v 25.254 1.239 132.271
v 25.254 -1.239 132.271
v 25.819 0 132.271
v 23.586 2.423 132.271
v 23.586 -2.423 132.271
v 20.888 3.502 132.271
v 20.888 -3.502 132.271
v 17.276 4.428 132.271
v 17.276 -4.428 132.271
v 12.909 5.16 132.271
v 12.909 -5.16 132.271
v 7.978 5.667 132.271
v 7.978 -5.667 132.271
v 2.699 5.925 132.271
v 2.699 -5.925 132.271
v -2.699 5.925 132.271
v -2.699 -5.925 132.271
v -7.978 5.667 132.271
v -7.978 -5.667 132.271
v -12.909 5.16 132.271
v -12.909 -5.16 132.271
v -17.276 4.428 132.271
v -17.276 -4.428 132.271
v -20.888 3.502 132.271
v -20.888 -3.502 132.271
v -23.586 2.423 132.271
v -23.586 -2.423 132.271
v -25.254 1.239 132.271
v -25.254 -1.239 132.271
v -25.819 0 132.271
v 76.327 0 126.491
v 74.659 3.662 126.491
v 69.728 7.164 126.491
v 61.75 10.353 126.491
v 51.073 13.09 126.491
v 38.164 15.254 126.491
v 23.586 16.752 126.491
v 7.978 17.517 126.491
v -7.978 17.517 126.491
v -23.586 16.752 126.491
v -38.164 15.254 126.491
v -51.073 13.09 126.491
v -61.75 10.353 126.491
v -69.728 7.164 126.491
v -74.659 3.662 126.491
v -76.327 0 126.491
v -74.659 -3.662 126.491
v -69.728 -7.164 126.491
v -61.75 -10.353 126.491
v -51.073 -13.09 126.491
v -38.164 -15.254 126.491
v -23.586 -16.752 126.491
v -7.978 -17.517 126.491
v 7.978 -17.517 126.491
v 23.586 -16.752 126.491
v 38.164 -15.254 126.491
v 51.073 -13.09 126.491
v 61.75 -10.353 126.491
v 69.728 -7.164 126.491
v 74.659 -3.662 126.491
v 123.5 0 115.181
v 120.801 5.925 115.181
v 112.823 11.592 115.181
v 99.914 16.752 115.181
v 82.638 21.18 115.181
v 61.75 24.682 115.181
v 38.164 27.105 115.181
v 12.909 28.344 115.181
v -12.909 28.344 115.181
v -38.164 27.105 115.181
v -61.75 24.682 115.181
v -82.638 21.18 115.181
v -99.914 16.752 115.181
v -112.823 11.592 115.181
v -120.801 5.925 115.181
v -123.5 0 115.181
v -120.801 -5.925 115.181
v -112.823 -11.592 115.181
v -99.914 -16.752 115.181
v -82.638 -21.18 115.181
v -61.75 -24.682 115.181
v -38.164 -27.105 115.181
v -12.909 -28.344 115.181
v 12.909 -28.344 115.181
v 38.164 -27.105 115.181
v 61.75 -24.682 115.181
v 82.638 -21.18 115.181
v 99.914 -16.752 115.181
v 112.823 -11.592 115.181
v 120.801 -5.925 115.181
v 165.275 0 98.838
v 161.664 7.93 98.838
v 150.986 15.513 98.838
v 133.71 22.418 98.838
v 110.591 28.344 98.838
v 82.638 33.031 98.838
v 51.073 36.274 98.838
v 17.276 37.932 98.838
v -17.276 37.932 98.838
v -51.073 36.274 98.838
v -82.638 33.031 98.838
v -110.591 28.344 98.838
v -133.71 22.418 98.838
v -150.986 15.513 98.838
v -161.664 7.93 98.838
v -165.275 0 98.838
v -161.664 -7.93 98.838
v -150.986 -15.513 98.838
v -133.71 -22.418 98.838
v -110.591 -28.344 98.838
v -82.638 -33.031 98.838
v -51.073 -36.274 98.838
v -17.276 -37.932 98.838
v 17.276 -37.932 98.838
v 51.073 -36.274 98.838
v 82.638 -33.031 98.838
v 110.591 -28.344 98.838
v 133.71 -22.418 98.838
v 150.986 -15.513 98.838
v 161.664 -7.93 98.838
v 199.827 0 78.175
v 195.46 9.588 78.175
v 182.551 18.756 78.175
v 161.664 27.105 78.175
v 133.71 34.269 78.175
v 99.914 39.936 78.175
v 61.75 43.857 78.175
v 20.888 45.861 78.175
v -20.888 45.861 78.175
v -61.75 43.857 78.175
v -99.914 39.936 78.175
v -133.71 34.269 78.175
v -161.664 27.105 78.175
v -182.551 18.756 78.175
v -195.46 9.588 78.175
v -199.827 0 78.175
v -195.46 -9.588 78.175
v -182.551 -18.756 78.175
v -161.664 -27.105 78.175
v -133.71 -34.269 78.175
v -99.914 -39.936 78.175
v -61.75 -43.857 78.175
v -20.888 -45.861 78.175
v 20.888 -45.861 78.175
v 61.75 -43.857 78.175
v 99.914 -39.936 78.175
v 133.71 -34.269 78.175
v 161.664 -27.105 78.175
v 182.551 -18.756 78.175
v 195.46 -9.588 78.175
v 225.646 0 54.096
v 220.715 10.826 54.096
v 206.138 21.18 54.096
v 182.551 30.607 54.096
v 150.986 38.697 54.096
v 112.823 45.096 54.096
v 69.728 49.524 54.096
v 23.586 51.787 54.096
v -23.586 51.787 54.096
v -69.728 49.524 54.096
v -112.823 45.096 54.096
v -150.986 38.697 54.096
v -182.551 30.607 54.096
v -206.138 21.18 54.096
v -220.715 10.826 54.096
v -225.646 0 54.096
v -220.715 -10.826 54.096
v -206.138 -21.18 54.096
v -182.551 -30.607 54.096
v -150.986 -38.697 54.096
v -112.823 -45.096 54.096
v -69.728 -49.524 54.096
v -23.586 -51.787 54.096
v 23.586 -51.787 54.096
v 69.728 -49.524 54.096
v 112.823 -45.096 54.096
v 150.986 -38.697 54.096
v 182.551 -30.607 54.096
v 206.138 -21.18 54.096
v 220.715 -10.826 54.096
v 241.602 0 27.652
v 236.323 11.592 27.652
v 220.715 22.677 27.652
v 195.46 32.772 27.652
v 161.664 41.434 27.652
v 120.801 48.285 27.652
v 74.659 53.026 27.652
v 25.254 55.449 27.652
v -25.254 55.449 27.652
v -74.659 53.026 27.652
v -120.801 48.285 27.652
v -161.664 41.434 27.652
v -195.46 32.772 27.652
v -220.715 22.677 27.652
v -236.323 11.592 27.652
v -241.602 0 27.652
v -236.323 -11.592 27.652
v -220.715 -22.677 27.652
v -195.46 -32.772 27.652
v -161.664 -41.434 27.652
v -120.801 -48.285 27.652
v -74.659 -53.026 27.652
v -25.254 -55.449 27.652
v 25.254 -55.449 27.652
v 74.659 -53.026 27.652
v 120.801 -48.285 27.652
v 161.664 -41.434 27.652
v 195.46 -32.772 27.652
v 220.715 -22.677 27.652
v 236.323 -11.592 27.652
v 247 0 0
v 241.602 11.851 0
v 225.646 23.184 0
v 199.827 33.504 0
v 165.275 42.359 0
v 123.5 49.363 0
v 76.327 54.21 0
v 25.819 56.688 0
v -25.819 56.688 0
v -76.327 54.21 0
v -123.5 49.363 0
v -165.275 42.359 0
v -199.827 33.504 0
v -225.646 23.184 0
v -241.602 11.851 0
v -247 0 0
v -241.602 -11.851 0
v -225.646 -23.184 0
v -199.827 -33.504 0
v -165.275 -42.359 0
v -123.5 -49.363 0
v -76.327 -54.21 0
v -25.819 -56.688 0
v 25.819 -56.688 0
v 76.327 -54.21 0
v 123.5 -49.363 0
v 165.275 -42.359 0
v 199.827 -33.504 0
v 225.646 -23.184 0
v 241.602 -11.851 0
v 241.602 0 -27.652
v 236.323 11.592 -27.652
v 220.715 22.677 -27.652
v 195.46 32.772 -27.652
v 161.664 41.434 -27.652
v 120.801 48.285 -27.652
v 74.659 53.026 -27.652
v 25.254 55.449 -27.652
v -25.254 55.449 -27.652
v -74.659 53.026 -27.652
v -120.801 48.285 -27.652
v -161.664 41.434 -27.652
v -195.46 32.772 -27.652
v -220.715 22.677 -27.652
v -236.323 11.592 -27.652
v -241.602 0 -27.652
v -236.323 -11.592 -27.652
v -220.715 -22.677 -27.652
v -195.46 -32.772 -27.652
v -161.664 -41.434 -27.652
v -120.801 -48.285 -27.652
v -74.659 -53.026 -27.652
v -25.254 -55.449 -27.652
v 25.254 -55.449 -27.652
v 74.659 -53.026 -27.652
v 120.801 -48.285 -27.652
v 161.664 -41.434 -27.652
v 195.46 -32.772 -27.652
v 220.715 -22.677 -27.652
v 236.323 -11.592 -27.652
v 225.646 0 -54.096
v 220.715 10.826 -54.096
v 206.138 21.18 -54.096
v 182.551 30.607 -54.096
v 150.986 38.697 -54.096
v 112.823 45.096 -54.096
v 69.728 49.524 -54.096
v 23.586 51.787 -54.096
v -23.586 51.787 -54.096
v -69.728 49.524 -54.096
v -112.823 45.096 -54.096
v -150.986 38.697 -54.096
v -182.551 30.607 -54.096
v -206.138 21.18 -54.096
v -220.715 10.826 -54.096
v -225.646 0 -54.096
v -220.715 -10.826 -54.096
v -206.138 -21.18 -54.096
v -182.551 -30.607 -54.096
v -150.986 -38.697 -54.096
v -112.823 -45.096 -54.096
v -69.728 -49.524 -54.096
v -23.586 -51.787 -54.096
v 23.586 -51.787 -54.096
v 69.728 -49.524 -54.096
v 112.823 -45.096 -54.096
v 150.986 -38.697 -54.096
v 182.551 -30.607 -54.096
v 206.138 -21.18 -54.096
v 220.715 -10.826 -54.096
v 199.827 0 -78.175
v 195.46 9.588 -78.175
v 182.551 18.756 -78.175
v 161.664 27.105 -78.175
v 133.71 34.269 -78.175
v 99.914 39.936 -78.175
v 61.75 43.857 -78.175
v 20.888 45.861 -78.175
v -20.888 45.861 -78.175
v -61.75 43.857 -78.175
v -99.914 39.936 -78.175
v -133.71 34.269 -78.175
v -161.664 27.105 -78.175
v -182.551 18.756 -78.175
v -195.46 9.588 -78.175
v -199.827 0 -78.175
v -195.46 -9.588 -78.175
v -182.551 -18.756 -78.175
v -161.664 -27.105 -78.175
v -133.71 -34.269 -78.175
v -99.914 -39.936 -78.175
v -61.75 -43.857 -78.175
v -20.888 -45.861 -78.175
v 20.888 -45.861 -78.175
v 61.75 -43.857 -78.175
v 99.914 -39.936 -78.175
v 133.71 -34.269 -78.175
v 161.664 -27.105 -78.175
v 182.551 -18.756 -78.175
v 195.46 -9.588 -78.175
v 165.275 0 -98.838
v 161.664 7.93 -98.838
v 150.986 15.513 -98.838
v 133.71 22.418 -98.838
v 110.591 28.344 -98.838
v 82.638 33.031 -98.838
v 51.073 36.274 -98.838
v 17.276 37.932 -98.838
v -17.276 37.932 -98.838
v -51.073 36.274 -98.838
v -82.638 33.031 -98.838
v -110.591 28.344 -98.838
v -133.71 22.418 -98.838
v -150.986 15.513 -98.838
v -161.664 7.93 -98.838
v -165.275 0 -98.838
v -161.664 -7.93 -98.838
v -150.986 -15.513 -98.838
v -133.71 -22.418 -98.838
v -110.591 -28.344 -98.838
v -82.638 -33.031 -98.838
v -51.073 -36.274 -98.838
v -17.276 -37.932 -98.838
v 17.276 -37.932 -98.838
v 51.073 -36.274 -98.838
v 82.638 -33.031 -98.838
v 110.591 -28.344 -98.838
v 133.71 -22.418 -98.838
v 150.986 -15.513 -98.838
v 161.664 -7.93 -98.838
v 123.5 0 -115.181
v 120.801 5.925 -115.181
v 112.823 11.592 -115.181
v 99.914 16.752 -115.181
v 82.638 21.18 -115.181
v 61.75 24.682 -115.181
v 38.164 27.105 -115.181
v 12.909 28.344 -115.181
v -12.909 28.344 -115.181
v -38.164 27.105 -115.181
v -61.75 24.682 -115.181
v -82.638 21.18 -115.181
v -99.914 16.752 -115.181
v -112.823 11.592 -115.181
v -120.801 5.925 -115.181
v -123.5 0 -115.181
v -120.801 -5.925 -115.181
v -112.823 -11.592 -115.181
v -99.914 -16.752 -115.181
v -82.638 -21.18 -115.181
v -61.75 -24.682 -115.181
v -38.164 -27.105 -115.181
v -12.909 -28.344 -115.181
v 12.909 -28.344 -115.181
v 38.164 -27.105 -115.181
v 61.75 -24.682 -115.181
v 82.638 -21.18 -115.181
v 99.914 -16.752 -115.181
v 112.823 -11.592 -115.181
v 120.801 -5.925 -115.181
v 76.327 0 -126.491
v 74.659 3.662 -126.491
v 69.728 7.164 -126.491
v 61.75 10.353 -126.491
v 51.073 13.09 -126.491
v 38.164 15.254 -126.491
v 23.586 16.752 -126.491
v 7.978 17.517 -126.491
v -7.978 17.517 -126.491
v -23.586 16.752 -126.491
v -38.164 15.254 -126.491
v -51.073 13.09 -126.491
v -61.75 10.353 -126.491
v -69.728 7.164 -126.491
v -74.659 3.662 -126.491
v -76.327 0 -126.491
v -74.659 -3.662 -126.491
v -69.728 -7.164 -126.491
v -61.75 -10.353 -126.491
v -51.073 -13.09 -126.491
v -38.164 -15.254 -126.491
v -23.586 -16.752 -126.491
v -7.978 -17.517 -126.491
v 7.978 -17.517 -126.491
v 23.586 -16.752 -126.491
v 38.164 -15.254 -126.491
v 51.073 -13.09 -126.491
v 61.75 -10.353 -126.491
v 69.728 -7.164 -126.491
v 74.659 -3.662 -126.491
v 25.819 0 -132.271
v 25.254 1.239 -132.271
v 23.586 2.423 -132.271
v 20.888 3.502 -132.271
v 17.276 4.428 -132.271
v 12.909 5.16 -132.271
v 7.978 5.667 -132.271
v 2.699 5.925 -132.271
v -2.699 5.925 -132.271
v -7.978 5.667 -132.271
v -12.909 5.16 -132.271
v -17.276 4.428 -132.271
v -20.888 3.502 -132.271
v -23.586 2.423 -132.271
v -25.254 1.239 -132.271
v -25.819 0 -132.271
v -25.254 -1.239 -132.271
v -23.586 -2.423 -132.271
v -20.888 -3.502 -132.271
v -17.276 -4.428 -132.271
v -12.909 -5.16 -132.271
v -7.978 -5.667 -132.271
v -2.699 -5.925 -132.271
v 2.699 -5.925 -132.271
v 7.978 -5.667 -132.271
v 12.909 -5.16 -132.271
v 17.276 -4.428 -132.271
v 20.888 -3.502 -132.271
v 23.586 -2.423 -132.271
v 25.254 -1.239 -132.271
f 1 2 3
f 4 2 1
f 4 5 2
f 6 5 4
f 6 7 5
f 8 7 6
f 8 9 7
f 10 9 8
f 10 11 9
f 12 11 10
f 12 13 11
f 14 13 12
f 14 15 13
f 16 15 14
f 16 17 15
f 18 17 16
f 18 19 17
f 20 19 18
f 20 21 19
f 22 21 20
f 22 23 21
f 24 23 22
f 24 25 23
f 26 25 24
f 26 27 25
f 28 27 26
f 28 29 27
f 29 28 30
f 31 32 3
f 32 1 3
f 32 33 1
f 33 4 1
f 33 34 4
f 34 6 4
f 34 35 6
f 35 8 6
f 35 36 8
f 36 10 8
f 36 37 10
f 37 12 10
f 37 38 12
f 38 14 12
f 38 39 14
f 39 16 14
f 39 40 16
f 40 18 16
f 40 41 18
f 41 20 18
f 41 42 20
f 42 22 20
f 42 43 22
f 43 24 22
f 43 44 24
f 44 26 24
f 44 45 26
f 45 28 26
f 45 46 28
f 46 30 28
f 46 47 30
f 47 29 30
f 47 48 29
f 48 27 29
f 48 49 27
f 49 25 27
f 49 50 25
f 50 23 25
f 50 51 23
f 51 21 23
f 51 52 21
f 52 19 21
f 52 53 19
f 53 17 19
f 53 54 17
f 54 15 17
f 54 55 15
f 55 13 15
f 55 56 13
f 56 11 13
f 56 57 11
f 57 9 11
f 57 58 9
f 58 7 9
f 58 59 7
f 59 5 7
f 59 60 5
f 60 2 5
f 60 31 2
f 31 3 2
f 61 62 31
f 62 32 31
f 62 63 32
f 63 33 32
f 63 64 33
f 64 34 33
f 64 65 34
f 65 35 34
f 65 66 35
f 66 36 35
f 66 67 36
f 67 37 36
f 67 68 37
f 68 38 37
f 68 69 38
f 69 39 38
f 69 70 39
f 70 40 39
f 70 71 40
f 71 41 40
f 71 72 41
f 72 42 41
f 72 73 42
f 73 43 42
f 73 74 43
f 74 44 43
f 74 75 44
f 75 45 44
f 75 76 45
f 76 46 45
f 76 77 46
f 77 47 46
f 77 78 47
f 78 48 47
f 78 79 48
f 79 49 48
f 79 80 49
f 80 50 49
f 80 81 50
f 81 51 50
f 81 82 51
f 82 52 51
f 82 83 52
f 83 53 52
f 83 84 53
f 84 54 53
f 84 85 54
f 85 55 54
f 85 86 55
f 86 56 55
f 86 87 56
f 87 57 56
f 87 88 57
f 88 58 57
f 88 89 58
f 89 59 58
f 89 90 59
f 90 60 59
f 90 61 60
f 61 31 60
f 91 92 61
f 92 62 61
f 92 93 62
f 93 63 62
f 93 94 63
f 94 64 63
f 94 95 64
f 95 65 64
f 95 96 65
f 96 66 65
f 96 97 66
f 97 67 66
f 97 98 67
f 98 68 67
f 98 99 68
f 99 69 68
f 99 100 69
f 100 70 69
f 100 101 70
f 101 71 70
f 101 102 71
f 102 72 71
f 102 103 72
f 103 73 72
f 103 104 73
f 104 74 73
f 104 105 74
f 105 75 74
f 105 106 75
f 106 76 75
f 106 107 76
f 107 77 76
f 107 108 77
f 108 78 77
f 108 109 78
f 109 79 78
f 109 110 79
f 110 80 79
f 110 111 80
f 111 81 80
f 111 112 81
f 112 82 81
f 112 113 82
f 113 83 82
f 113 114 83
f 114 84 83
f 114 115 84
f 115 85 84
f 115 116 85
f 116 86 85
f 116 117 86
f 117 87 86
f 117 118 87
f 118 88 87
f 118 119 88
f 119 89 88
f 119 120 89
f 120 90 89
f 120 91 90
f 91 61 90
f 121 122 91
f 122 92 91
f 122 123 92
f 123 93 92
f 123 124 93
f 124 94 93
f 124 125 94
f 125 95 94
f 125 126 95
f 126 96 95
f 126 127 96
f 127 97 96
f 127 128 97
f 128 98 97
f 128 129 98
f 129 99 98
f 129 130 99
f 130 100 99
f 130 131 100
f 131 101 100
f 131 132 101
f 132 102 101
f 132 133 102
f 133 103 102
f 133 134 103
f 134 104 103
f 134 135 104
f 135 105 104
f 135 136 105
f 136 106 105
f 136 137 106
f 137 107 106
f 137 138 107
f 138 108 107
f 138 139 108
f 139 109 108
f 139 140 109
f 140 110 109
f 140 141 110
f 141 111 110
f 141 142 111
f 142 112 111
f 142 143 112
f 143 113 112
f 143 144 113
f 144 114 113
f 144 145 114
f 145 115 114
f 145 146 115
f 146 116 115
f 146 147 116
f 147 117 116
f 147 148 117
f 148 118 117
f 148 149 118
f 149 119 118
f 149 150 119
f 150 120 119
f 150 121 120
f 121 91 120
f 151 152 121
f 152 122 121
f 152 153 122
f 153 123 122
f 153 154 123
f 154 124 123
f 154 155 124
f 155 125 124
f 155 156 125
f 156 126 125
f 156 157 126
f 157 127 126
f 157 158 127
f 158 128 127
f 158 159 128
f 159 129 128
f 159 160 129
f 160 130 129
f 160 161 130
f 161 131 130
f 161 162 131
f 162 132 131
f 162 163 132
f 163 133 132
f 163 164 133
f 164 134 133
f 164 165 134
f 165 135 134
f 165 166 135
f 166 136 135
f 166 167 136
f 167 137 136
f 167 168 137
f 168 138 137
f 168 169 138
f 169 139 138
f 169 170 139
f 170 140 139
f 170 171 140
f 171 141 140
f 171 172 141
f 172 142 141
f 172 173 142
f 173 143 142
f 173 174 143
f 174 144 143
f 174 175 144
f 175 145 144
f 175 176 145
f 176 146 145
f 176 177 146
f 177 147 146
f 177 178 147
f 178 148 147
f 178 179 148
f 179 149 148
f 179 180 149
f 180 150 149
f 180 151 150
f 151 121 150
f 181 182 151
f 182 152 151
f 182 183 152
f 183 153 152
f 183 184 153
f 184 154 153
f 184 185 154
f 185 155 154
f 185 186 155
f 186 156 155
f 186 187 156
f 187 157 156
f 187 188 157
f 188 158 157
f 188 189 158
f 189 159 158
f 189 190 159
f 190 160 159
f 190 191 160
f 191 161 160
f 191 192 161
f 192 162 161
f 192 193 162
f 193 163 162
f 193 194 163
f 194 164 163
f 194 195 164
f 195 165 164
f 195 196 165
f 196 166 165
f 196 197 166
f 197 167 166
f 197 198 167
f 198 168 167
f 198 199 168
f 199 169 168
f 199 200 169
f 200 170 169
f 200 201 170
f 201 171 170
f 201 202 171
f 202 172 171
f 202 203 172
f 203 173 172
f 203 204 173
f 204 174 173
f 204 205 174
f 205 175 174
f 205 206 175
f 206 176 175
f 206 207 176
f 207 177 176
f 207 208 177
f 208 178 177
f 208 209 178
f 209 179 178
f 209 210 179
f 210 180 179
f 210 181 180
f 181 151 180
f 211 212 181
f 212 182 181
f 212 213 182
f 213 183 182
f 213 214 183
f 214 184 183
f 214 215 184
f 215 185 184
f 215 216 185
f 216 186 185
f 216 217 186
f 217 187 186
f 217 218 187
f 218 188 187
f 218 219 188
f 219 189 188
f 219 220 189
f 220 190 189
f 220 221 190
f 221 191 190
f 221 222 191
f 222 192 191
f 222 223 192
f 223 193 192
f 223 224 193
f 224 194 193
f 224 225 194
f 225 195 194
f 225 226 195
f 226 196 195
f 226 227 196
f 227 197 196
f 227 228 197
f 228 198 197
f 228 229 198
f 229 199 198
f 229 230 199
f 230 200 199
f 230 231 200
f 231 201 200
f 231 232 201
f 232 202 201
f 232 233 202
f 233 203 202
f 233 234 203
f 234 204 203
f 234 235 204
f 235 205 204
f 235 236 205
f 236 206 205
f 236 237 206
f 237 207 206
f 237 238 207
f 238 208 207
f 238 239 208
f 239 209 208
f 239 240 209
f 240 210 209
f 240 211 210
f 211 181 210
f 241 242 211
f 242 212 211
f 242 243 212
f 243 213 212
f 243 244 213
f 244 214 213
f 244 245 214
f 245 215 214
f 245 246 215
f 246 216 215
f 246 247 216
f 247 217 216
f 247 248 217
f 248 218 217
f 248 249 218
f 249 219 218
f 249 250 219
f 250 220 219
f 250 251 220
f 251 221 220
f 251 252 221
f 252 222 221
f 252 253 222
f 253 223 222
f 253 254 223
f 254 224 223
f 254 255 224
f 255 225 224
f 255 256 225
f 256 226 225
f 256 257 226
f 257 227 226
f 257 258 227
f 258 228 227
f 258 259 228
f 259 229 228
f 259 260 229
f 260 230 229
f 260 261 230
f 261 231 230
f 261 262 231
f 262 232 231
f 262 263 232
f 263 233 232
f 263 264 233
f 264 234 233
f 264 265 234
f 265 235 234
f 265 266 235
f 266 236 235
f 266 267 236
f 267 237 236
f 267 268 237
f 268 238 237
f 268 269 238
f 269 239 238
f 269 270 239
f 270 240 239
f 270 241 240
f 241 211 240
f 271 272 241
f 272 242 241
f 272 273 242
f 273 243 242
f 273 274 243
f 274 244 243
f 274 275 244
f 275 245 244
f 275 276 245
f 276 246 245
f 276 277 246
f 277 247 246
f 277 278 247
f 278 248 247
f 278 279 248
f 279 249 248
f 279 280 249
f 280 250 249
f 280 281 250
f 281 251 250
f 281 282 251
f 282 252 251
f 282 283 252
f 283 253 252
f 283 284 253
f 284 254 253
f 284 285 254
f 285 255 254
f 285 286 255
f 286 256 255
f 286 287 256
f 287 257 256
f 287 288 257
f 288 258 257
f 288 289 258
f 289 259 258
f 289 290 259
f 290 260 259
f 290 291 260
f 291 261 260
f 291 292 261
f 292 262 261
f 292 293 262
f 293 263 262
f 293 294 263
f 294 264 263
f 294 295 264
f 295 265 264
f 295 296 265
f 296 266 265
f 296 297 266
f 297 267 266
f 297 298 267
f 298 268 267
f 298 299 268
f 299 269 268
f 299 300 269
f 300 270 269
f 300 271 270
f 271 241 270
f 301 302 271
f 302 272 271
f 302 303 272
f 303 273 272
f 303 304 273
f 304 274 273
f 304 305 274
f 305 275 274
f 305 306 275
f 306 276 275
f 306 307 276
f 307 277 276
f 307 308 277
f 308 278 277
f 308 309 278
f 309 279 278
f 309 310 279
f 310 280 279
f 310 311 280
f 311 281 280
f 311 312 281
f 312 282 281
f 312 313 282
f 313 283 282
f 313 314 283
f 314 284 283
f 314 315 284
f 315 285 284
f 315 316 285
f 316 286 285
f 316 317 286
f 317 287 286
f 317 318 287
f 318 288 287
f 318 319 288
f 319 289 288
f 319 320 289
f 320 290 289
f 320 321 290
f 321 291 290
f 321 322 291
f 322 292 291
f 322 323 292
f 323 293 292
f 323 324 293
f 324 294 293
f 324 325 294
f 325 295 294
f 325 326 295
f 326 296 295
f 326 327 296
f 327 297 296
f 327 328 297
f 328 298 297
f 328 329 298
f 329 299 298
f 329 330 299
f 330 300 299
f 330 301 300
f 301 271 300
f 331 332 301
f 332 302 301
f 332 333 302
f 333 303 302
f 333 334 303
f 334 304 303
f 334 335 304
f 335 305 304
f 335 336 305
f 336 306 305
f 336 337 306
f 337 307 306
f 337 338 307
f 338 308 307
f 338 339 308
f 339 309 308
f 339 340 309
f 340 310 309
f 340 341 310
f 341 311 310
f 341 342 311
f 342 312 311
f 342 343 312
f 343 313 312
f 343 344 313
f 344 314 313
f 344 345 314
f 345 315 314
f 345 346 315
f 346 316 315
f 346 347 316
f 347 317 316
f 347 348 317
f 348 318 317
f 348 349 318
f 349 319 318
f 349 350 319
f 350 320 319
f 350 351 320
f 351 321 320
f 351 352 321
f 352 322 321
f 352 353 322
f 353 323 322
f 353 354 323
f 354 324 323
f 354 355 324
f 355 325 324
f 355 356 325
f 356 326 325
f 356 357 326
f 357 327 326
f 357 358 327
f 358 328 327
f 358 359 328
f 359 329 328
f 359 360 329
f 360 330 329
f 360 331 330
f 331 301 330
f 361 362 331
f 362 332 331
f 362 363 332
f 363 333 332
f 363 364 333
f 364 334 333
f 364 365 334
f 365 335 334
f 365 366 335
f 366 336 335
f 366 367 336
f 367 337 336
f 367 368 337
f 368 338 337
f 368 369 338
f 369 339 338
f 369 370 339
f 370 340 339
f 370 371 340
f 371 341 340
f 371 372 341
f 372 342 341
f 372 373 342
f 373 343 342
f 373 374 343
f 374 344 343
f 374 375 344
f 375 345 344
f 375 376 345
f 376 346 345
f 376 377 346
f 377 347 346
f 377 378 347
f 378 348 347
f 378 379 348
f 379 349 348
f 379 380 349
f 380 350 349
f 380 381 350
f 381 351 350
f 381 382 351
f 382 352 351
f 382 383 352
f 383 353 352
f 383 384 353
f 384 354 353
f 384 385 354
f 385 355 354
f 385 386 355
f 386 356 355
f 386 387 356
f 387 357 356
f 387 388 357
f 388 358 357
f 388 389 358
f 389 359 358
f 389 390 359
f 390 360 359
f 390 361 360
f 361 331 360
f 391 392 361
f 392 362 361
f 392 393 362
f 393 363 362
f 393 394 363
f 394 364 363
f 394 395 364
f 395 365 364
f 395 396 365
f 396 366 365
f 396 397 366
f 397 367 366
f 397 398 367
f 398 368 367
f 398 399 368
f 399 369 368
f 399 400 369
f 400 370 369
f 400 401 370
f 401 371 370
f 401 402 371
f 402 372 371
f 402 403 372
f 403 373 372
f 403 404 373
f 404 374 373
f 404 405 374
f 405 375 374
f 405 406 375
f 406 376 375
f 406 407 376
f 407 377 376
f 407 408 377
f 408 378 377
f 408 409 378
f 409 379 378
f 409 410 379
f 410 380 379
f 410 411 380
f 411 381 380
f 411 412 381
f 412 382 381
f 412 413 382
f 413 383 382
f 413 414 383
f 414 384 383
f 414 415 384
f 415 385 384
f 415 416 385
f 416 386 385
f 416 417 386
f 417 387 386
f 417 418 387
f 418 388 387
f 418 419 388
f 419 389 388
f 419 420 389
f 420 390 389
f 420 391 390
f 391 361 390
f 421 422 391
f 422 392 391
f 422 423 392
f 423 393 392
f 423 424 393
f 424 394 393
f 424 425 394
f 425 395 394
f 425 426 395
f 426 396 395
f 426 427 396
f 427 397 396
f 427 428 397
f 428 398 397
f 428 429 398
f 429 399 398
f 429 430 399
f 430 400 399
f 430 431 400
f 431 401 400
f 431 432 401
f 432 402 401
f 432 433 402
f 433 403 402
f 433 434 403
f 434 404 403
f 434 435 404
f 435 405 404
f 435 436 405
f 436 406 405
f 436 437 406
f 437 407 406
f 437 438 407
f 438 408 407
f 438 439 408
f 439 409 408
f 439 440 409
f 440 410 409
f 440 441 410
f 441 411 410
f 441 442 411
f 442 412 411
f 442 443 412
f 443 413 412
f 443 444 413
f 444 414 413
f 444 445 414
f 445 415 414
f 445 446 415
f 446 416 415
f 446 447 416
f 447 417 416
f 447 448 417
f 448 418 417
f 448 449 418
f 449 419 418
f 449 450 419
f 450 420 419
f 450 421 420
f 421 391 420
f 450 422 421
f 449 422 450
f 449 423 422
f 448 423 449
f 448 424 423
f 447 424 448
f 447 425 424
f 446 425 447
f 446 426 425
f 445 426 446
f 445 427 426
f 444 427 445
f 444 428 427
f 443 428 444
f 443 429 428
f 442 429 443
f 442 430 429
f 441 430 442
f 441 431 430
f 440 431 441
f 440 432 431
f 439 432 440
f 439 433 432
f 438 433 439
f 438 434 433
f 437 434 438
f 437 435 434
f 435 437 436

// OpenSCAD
// Generated by SolidPython 1.0.1 on 2020-07-29 00:46:50


scale(v = [13, 3, 7]) {
	sphere(r = 19);
}
/***********************************************
*********      SolidPython code:      **********
************************************************
 
# import packages: SolidPython
from solid import *
from solid.utils import *
from itertools import chain, combinations, permutations


class Resize:

    def __init__(self, scad_file):
        self.scad_file = scad_file
        #self.scad_file = import_scad(scad_file)
        # cone/cylinder param:
        self.r1 = 0
        self.r2 = 0
        self.h = 0
        # rectangular prism param:
        self.w = 0
        self.l = 0
        # ellipse param:
        self.r = 0

    # import OpenScad code (file name corresponds to shape)


    # classify shape + parameters
    def assign(self, param1, param2, param3):
        if self.scad_file == 'cone.scad':
            self.r1 = param1
            self.r2 = param2
            self.h = param3
        elif self.scad_file == 'cylinder.scad':
            self.r1 = param1
            self.r2 = param2
            self.h = param3
        elif self.scad_file == 'rectangularPrism.scad':
            self.h = param1
            self.l = param2
            self.w = param3
        else:
            self.r = param1
            self.h = param2

    # resize parameters
    def iterate(self):
        x = range(3, 20, 2)
        i = 1
        if self.scad_file == 'cone.scad':
            tempList = list(permutations(x, 2))
            for temp in tempList:
                param1 = temp[0]
                param2 = temp[1]
                filepath = 'produced_scad_files/' + 'cone' + str(param1) + '_' + str(param2) + '_' + '.scad'
                scad_render_to_file(cylinder(h=param1, r1=param2, r2=0), filepath)

        elif self.scad_file == 'cylinder.scad':
            tempList = list(permutations(x, 3))
            for temp in tempList:
                param1 = temp[0]
                param2 = temp[1]
                filepath = 'produced_scad_files/' + 'cylinder' + str(param1) + '_' + str(param2) + '_' + '.scad'
                scad_render_to_file(cylinder(h=param1, r1=param2, r2=param2), filepath)

        elif self.scad_file == 'rectangularPrism.scad':
            tempList = list(permutations(x, 3))
            for temp in tempList:
                param1 = temp[0]
                param2 = temp[1]
                param3 = temp[2]
                filepath = 'produced_scad_files/' + 'rectangularPrism' + str(param1) + '_' + str(param2) + '_' + str(
                    param3) + '.scad'
                scad_render_to_file(cube(size=(param1, param2, param3)), filepath)

        elif self.scad_file == 'ellipse.scad':
            tempList = list(permutations(x, 4))
            for temp in tempList:
                param1 = temp[0]
                param2 = temp[1]
                param3 = temp[2]
                param4 = temp[3]
                filepath = 'produced_scad_files/' + 'ellipse' + str(param1) + '_' + str(param2) + '_' + str(param3) + '_' + str(param4) + '.scad'
                scad_render_to_file(scale([param1, param2, param3])(sphere(r=param4)), filepath)

    def render_to_scadfile(self):
        scad_render_to_file(scad, 'example.scad') 
 
************************************************/
